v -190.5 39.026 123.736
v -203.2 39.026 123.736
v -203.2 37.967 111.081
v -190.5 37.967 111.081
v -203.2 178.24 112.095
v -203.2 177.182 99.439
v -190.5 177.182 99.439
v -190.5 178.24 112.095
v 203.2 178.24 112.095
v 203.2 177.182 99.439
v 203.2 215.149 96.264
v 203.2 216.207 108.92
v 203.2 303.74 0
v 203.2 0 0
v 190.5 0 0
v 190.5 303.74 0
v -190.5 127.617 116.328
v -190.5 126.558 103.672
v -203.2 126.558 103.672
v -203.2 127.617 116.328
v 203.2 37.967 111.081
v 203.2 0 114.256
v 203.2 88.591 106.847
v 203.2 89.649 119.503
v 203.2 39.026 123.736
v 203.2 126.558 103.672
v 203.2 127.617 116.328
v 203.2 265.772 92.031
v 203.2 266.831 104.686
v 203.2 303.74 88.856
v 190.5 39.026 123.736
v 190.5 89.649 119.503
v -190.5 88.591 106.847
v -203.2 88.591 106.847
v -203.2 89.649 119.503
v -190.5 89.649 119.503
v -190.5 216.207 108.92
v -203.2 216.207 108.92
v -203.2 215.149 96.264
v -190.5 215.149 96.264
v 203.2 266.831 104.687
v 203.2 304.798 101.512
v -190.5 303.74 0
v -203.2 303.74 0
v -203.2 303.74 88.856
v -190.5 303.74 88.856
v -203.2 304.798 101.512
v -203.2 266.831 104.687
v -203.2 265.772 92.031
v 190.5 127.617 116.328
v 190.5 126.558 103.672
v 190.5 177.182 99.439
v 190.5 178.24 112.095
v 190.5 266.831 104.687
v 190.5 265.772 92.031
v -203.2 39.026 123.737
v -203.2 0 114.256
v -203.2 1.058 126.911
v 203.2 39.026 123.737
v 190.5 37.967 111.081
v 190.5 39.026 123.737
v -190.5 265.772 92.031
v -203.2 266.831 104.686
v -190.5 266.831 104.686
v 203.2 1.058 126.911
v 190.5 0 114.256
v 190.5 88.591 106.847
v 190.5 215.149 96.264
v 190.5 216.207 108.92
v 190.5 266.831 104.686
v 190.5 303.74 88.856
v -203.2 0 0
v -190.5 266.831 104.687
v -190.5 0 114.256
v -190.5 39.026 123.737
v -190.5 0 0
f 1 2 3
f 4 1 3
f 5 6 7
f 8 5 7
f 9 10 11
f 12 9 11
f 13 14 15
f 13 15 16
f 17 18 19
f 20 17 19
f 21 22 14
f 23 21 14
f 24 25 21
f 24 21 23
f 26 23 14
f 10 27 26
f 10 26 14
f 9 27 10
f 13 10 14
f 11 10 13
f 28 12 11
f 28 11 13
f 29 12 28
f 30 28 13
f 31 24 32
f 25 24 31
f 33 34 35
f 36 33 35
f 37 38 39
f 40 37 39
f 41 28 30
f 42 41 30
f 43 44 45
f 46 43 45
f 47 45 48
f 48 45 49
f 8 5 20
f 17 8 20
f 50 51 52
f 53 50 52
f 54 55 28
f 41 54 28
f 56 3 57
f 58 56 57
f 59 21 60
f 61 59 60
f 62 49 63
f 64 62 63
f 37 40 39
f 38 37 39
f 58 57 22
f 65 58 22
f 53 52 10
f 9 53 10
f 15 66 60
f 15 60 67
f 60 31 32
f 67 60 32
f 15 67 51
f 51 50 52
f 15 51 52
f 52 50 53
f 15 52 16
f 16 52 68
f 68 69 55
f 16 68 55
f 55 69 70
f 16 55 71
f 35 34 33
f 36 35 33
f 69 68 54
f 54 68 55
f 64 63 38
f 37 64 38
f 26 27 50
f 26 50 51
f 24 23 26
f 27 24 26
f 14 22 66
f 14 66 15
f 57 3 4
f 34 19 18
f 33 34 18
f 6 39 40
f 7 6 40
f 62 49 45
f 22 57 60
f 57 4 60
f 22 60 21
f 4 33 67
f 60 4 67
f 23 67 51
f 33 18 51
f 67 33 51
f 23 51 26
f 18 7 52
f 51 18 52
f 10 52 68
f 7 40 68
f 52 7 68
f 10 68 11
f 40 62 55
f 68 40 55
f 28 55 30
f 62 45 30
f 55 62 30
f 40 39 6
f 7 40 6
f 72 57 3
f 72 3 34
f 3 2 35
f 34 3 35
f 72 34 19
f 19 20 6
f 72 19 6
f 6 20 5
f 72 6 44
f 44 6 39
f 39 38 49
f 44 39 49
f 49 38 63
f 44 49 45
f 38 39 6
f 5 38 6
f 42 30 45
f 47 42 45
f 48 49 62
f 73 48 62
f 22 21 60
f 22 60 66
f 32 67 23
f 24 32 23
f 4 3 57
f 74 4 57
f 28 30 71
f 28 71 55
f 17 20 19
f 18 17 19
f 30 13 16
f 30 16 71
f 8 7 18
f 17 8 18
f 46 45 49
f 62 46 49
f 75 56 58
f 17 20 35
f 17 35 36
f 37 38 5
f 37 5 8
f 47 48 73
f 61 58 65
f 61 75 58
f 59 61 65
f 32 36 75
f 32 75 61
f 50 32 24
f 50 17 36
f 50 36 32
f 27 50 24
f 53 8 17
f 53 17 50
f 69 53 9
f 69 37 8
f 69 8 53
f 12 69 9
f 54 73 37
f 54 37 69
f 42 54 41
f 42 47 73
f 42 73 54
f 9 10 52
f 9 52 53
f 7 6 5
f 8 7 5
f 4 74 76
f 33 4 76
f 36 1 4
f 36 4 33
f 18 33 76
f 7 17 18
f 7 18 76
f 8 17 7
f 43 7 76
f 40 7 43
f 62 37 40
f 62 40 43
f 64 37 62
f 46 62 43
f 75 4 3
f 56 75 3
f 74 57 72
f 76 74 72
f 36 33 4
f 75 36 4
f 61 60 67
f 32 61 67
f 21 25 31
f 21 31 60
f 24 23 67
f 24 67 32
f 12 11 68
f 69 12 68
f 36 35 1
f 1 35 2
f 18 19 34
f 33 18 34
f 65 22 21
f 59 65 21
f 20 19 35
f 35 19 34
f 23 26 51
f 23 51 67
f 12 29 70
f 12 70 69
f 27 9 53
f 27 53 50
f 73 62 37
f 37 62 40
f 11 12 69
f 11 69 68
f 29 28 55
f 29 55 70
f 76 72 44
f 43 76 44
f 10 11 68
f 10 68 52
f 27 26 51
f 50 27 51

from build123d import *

# Parameters (mm, degrees)
F2_DEPTH = 12.7
F5_DEPTH = 12.7


with BuildPart() as f2:
    # F1 (on offset) → F2 (new body)
    with BuildSketch(Plane.YZ.offset(203.2)):
        Polygon((0, 114.255672), (0, 0), (303.739823, 0), (303.739823, 88.855672), (265.772345, 92.030672), (266.830678, 104.686498), (216.207375, 108.919831), (215.149041, 96.264005), (177.181563, 99.439005), (178.239897, 112.094831), (127.616593, 116.328164), (126.55826, 103.672338), (88.590782, 106.847338), (89.649115, 119.503164), (39.025811, 123.736498), (37.967478, 111.080672), align=None)
    extrude(amount=-F2_DEPTH)


with BuildPart() as f3_1:
    # F3: instance of F2
    add(f2.part.mirror(Plane.YZ))


with BuildPart() as f5:
    # F4 (on face) → F5 (new body)
    with BuildSketch(Plane(origin=(0, 9.488188, 113.46223), x_dir=(1, 0, 0), z_dir=(0, 0.083333, 0.996522))):
        Polygon((203.2, 295.278694), (190.5, 295.278694), (-203.2, 295.278694), (-203.2, 257.178694), (-190.5, 257.178694), (-190.5, 206.378694), (-203.2, 206.378694), (-203.2, 168.278694), (-190.5, 168.278694), (-190.5, 117.478694), (-203.2, 117.478694), (-203.2, 79.378694), (-190.5, 79.378694), (-190.5, 28.578694), (-203.2, 28.578694), (-203.2, -9.521306), (203.2, -9.521306), (203.2, 28.578694), (190.5, 28.578694), (190.5, 79.378694), (203.2, 79.378694), (203.2, 117.478694), (190.5, 117.478694), (190.5, 168.278694), (203.2, 168.278694), (203.2, 206.378694), (190.5, 206.378694), (190.5, 257.178694), (203.2, 257.178694), align=None)
    extrude(amount=F5_DEPTH)


solid = Compound([f2.part, f3_1.part, f5.part])
